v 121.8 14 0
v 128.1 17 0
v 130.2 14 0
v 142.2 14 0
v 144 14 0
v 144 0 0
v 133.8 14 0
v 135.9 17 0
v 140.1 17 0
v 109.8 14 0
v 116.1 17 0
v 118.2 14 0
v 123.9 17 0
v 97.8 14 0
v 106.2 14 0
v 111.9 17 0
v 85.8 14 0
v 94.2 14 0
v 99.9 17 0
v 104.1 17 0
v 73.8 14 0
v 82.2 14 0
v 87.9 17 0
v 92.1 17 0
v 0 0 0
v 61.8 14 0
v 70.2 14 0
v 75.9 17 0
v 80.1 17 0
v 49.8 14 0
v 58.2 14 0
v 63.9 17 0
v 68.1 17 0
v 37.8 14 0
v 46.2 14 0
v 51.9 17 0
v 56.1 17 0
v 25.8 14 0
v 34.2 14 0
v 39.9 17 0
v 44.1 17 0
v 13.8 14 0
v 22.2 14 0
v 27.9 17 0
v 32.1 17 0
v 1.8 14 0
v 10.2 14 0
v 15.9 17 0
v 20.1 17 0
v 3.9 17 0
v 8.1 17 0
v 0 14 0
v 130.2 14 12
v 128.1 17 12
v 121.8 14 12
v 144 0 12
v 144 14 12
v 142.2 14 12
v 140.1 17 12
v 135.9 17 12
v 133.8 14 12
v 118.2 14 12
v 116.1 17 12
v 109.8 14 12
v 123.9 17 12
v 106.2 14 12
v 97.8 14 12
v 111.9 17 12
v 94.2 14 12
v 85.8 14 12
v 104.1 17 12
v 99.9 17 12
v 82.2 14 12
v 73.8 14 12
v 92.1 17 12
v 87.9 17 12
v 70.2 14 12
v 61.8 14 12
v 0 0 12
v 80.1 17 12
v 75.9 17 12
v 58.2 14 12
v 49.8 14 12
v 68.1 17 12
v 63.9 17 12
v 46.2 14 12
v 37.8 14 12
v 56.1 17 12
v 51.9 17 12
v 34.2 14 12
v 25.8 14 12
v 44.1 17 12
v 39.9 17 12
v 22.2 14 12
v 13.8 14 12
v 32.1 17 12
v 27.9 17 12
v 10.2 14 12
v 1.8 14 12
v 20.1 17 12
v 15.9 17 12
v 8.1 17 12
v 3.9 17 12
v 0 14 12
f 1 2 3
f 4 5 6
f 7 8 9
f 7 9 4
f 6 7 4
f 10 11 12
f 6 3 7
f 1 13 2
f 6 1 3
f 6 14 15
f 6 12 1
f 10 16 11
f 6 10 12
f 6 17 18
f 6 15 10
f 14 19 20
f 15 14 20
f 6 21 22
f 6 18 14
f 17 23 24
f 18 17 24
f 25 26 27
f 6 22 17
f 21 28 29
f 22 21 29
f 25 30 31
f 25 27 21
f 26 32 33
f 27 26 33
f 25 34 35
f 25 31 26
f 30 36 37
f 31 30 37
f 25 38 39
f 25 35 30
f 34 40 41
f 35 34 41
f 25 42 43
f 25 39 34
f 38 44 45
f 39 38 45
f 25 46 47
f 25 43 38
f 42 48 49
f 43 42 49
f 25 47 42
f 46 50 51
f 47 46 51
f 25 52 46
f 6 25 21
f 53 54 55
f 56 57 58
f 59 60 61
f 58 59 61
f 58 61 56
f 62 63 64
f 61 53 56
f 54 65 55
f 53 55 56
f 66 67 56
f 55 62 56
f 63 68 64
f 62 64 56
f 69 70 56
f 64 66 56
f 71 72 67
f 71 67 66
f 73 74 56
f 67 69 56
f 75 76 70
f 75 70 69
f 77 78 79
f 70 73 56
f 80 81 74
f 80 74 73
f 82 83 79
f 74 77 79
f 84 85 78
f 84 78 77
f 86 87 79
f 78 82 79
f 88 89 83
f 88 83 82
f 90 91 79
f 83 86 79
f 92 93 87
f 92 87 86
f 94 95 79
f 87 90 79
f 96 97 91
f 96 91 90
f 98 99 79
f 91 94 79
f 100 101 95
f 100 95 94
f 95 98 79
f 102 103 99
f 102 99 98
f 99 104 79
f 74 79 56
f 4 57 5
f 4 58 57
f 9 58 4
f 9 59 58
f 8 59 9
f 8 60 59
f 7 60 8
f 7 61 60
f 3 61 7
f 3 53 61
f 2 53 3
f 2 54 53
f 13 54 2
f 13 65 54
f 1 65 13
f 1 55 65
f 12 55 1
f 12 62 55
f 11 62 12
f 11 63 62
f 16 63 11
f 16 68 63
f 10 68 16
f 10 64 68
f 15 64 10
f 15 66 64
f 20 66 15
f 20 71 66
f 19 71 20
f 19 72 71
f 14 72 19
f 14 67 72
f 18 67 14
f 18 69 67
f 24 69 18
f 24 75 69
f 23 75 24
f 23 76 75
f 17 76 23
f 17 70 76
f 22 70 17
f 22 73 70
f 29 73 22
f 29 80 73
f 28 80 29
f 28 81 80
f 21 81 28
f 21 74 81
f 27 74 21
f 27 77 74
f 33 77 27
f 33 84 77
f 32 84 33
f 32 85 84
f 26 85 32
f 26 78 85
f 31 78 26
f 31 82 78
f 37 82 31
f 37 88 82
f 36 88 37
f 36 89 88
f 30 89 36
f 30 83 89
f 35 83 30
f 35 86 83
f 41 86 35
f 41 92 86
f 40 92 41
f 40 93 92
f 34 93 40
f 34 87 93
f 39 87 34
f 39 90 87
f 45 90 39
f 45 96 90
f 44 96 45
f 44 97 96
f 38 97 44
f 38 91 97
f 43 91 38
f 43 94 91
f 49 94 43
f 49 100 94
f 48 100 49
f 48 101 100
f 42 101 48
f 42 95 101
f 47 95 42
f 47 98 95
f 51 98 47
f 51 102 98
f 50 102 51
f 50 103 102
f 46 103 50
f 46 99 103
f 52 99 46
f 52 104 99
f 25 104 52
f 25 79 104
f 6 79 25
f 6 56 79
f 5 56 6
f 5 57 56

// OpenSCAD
$fn = 32;

// ----------------------------------------------------------------------
// Gear rack: 12 teeth, pitch 12 mm
// ----------------------------------------------------------------------

// --- parameters (mm) ---
teeth = 12;               // number of teeth
pitch = 12;               // tooth pitch, X
root_w = 8.4;             // tooth width at the root
tip_w = 4.2;              // tooth width at the tip
base_h = 14;              // rack body height, Y
tooth_h = 3;              // tooth height above the body
plate_t = 12;             // rack width, Z (extrusion height)

rack_l = teeth * pitch;  // overall length
total_h = base_h + tooth_h;  // overall height

profile = [[0, 0], [144, 0], [144, 14], [142.2, 14], [140.1, 17], [135.9, 17], [133.8, 14], [130.2, 14], [128.1, 17], [123.9, 17], [121.8, 14], [118.2, 14], [116.1, 17], [111.9, 17], [109.8, 14], [106.2, 14], [104.1, 17], [99.9, 17], [97.8, 14], [94.2, 14], [92.1, 17], [87.9, 17], [85.8, 14], [82.2, 14], [80.1, 17], [75.9, 17], [73.8, 14], [70.2, 14], [68.1, 17], [63.9, 17], [61.8, 14], [58.2, 14], [56.1, 17], [51.9, 17], [49.8, 14], [46.2, 14], [44.1, 17], [39.9, 17], [37.8, 14], [34.2, 14], [32.1, 17], [27.9, 17], [25.8, 14], [22.2, 14], [20.1, 17], [15.9, 17], [13.8, 14], [10.2, 14], [8.1, 17], [3.9, 17], [1.8, 14], [0, 14]];  // primary outline, 52 points, counter clockwise

// --- the one profile operation ---
linear_extrude(height = plate_t) polygon(points = profile);
